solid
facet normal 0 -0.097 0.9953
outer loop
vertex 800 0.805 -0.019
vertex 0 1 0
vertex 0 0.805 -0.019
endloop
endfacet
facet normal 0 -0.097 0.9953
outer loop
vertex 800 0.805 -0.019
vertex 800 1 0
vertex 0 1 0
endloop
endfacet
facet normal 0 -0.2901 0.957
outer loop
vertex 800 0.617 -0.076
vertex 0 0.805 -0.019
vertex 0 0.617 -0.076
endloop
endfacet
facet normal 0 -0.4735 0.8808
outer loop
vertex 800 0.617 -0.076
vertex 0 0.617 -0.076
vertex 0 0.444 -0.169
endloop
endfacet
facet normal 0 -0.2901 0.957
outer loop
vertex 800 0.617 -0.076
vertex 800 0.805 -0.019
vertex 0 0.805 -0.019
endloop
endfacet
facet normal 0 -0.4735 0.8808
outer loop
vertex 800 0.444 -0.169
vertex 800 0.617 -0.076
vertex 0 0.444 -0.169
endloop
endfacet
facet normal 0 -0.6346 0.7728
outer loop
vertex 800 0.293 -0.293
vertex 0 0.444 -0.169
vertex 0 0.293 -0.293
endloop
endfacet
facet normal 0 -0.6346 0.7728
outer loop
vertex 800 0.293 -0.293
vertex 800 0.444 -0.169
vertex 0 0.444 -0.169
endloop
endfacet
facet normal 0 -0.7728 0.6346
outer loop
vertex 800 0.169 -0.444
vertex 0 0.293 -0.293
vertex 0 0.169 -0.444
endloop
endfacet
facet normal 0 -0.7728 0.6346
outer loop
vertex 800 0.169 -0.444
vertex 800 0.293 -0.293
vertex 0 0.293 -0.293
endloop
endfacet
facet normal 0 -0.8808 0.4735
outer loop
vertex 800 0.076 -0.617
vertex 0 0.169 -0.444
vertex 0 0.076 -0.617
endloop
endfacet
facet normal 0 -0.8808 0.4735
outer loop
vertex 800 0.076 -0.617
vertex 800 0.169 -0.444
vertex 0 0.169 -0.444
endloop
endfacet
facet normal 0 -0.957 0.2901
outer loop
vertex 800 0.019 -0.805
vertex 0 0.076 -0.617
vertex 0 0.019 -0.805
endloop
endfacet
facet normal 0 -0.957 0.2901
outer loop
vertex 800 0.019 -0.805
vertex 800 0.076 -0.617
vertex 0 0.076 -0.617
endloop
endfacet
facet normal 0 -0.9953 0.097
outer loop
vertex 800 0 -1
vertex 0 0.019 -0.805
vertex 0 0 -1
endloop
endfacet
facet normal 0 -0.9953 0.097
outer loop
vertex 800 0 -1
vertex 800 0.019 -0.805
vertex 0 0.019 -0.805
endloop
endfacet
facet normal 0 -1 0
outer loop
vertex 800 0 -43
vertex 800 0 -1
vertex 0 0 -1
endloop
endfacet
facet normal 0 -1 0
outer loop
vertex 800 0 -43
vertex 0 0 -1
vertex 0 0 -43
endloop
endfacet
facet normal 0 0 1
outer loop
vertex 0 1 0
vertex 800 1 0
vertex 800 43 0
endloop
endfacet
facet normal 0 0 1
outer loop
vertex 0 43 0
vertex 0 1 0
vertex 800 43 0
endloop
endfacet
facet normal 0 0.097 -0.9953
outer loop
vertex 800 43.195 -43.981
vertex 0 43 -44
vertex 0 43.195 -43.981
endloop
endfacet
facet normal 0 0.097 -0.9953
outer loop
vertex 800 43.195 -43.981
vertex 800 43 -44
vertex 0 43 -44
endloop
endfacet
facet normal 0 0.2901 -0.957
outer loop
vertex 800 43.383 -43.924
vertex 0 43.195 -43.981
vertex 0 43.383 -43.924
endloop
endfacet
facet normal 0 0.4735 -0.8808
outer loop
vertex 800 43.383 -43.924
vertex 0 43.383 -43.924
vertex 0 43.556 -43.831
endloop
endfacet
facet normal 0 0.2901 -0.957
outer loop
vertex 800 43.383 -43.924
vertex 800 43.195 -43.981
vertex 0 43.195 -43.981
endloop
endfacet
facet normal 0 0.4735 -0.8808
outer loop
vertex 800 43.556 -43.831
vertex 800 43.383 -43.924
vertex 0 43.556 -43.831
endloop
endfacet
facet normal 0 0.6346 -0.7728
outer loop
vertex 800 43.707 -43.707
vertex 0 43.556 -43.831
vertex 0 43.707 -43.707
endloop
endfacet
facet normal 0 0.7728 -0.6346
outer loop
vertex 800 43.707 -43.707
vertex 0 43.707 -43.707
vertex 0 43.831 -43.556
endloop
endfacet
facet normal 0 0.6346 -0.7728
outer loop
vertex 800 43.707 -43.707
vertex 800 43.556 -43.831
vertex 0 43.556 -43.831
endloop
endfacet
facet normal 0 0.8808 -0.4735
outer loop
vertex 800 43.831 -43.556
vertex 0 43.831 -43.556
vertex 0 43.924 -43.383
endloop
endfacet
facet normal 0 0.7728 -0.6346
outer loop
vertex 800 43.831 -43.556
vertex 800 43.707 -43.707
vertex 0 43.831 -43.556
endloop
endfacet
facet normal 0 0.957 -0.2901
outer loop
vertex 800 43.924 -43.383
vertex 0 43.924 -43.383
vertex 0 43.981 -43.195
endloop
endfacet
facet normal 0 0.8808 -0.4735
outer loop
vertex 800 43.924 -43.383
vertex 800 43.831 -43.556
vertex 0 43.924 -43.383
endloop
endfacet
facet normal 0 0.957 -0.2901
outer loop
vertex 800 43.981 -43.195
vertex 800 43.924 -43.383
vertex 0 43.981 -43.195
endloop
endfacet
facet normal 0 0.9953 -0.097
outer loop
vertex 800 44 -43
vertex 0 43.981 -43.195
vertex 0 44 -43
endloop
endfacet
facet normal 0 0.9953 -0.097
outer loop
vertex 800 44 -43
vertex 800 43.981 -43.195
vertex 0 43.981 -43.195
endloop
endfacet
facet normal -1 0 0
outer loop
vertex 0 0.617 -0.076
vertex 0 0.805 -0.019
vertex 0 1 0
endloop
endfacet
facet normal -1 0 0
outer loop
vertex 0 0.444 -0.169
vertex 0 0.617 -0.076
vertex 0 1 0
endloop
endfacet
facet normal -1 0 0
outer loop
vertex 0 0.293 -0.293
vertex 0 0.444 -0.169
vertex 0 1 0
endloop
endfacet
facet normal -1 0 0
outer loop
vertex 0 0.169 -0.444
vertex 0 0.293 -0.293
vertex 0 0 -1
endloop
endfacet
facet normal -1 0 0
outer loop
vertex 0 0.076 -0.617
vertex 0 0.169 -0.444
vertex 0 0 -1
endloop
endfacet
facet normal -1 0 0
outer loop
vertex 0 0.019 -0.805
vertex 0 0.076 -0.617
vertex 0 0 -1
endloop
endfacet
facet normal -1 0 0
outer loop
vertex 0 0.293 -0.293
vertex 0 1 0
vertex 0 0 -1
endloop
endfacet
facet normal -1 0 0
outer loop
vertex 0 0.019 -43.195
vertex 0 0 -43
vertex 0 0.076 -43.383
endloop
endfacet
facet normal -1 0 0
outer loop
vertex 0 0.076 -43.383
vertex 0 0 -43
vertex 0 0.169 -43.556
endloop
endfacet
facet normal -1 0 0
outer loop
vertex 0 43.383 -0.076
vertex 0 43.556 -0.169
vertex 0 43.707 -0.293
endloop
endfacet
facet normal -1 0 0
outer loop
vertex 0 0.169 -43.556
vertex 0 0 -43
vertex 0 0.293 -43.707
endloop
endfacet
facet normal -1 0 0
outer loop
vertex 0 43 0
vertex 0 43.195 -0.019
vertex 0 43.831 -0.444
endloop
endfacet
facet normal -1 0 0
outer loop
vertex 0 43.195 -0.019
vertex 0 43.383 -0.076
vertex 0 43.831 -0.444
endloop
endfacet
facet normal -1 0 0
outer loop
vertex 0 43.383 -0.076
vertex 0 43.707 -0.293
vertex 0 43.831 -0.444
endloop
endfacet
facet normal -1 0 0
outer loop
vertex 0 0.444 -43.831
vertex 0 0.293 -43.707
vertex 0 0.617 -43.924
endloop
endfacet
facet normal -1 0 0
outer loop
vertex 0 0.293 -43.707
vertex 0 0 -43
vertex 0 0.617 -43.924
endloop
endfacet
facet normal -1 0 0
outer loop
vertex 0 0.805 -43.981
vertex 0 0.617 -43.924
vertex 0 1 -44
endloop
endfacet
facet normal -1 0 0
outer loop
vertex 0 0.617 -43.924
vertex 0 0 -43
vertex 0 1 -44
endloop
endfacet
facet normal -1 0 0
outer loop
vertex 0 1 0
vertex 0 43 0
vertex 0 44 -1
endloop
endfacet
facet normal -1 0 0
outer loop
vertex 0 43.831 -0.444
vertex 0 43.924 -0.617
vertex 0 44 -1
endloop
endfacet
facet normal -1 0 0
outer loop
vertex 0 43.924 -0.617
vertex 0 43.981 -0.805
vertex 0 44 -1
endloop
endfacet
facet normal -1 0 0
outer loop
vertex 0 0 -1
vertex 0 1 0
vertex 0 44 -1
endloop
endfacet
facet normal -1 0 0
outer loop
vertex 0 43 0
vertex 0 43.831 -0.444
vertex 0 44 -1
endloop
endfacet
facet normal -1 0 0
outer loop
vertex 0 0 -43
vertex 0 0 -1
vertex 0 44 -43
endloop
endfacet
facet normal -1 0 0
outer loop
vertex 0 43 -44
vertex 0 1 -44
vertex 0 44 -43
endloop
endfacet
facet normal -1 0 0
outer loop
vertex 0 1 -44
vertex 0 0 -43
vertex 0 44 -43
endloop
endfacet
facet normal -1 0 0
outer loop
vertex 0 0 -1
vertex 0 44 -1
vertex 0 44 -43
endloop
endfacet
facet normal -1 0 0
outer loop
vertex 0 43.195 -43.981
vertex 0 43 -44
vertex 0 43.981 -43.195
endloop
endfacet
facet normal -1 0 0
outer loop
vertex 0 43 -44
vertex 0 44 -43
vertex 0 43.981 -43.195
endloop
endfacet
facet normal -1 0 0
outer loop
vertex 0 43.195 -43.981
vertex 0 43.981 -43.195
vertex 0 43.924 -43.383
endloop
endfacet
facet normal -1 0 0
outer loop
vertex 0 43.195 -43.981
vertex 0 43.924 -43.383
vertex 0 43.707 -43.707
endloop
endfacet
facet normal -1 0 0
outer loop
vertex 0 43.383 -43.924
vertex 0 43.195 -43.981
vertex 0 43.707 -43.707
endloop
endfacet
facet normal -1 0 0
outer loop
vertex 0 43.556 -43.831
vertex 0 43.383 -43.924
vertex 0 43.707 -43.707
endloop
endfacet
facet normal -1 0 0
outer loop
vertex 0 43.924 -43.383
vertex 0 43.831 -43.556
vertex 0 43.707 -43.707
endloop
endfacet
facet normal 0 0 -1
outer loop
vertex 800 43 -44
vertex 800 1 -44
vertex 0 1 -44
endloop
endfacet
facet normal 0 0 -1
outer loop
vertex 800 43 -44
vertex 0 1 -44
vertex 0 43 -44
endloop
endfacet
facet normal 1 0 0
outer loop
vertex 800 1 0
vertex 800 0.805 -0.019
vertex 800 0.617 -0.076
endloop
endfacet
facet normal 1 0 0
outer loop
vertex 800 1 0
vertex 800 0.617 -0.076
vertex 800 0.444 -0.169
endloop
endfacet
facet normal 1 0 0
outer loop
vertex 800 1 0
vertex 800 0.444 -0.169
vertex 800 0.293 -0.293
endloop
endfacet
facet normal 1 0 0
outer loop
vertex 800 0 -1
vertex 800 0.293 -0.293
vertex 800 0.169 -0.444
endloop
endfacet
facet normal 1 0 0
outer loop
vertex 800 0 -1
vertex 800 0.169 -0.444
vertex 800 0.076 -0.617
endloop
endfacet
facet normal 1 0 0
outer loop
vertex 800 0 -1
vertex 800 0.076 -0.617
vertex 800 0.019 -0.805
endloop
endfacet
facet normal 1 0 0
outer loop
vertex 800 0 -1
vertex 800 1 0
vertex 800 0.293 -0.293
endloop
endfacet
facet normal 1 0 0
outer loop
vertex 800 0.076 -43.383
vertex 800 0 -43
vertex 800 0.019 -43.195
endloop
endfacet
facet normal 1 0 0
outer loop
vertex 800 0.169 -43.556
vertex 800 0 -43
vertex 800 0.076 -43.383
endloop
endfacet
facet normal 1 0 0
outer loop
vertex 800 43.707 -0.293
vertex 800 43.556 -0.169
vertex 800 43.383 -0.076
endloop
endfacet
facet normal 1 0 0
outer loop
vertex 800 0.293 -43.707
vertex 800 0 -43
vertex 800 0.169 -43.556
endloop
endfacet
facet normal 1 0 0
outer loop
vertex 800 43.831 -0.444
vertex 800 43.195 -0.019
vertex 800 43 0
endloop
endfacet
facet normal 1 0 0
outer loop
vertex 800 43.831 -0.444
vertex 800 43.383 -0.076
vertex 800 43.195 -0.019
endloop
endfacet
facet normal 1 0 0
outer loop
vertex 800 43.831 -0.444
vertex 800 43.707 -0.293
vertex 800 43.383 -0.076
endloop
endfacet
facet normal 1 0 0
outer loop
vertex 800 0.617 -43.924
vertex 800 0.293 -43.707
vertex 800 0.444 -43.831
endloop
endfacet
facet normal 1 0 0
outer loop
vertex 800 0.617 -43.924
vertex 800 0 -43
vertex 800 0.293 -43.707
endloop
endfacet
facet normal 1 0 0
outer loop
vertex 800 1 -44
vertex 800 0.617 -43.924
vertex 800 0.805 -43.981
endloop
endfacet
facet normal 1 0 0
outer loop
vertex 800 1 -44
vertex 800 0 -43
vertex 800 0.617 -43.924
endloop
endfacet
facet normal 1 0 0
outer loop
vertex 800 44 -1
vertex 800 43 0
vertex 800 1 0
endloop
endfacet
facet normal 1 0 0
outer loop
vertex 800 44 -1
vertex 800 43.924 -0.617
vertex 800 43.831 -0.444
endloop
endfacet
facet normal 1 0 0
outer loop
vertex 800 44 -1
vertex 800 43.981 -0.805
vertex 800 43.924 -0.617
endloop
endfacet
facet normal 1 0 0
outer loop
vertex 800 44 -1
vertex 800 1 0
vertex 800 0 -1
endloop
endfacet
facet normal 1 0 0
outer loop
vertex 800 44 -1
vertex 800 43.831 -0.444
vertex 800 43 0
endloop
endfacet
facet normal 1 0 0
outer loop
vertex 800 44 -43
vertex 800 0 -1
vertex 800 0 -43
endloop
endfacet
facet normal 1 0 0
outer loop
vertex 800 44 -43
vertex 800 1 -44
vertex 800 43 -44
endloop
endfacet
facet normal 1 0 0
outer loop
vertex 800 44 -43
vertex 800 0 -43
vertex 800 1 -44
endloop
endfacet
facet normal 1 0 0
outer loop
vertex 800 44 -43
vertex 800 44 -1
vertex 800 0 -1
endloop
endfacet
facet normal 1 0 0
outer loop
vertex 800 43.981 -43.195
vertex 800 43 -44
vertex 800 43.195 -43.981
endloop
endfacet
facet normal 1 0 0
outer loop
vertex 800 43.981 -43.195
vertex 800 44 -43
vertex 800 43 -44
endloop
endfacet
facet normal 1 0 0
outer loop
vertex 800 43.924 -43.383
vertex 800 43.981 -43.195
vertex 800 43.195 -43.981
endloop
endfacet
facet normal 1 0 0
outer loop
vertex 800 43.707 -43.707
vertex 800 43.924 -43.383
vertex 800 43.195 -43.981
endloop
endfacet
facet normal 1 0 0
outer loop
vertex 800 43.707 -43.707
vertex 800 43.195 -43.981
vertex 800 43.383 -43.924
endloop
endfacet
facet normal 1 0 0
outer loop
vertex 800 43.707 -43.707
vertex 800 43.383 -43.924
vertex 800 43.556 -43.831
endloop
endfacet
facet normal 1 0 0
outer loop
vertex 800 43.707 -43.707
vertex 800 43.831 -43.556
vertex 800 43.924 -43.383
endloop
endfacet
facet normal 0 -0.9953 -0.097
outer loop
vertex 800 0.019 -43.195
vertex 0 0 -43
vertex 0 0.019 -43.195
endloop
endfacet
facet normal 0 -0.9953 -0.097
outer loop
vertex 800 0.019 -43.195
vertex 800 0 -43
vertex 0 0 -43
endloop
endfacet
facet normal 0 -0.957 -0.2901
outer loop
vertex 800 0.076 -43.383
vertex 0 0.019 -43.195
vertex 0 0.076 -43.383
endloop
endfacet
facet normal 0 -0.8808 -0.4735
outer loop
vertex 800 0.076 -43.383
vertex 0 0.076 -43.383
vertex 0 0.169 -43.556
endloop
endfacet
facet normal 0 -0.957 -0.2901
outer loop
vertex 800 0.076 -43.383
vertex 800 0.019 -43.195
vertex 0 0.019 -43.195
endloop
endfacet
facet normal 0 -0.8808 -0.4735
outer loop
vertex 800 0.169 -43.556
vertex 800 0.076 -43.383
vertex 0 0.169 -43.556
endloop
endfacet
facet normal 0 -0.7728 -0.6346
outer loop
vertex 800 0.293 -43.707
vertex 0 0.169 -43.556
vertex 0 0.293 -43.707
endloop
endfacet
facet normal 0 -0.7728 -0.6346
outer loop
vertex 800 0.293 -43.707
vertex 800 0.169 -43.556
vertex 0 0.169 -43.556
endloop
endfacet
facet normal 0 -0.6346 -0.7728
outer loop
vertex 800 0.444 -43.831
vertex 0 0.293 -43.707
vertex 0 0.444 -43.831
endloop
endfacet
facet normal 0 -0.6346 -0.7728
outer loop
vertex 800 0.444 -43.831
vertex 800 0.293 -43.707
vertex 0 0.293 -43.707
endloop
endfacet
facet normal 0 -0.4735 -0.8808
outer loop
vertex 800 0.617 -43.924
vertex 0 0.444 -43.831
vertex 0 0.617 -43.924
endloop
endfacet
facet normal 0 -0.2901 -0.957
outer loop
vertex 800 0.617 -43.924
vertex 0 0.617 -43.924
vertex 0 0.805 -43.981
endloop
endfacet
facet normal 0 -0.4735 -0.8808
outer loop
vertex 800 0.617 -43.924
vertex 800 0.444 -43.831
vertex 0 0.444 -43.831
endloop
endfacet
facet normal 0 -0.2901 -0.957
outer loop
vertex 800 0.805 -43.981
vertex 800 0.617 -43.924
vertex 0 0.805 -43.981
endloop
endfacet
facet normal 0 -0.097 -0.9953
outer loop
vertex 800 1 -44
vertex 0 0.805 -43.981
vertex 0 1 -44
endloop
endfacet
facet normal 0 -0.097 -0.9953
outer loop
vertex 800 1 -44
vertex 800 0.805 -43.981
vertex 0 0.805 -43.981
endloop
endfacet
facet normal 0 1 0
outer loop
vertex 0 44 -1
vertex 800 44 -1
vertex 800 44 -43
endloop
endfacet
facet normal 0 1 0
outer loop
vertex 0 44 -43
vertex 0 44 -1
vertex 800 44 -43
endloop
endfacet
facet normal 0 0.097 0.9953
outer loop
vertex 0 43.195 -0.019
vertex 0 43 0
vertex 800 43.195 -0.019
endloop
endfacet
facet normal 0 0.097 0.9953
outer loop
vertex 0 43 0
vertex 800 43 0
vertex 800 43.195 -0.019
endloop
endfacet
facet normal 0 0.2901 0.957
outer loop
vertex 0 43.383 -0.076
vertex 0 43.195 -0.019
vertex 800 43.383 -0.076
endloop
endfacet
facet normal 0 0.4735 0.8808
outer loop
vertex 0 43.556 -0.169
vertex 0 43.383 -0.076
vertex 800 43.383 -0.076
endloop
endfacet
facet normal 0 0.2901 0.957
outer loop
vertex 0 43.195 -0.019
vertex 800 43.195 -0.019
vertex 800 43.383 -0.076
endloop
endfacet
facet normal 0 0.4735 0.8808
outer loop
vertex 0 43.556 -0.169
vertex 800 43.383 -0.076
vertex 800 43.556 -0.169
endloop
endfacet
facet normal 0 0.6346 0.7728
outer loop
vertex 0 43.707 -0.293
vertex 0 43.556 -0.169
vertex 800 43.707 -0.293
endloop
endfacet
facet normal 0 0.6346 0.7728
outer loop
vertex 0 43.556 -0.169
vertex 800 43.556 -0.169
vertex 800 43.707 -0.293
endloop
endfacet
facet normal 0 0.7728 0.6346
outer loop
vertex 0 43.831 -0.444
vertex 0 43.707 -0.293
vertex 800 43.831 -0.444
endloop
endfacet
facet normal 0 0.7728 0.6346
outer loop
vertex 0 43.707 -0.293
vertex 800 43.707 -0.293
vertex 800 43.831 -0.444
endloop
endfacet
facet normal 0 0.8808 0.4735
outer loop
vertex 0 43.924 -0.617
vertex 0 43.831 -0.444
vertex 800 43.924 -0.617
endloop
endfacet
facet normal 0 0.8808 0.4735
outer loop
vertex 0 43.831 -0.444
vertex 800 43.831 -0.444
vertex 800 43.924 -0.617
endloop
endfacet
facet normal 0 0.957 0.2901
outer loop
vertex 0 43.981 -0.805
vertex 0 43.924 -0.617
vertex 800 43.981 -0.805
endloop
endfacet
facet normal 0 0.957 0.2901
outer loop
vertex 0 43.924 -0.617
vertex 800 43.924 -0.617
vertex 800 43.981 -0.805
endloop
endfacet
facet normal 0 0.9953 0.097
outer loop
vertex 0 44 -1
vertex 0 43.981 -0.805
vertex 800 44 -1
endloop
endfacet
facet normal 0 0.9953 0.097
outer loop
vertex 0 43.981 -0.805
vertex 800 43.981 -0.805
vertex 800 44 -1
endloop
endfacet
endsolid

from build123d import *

# Parameters (mm, degrees)
SKETCH1_W           = 44
SKETCH1_H           = 44
BOSS_EXTRUDE1_DEPTH = 800
FILLET1_R           = 1


with BuildPart() as part:
    # Sketch1 → Boss-Extrude1 (new body)
    with BuildSketch(Plane(origin=(0, 0, 0), x_dir=(0, 0, -1), z_dir=(1, 0, 0))):
        with Locations((22, 22)):
            Rectangle(SKETCH1_W, SKETCH1_H)
    extrude(amount=BOSS_EXTRUDE1_DEPTH)

    # Fillet1
    fillet1_edges = [part.edges().sort_by_distance(p)[0] for p in [
        (400, 44, 0),
        (400, 44, -44),
        (400, 0, -44),
        (400, 0, 0),
    ]]
    fillet(fillet1_edges, radius=FILLET1_R)


solid = part.part
